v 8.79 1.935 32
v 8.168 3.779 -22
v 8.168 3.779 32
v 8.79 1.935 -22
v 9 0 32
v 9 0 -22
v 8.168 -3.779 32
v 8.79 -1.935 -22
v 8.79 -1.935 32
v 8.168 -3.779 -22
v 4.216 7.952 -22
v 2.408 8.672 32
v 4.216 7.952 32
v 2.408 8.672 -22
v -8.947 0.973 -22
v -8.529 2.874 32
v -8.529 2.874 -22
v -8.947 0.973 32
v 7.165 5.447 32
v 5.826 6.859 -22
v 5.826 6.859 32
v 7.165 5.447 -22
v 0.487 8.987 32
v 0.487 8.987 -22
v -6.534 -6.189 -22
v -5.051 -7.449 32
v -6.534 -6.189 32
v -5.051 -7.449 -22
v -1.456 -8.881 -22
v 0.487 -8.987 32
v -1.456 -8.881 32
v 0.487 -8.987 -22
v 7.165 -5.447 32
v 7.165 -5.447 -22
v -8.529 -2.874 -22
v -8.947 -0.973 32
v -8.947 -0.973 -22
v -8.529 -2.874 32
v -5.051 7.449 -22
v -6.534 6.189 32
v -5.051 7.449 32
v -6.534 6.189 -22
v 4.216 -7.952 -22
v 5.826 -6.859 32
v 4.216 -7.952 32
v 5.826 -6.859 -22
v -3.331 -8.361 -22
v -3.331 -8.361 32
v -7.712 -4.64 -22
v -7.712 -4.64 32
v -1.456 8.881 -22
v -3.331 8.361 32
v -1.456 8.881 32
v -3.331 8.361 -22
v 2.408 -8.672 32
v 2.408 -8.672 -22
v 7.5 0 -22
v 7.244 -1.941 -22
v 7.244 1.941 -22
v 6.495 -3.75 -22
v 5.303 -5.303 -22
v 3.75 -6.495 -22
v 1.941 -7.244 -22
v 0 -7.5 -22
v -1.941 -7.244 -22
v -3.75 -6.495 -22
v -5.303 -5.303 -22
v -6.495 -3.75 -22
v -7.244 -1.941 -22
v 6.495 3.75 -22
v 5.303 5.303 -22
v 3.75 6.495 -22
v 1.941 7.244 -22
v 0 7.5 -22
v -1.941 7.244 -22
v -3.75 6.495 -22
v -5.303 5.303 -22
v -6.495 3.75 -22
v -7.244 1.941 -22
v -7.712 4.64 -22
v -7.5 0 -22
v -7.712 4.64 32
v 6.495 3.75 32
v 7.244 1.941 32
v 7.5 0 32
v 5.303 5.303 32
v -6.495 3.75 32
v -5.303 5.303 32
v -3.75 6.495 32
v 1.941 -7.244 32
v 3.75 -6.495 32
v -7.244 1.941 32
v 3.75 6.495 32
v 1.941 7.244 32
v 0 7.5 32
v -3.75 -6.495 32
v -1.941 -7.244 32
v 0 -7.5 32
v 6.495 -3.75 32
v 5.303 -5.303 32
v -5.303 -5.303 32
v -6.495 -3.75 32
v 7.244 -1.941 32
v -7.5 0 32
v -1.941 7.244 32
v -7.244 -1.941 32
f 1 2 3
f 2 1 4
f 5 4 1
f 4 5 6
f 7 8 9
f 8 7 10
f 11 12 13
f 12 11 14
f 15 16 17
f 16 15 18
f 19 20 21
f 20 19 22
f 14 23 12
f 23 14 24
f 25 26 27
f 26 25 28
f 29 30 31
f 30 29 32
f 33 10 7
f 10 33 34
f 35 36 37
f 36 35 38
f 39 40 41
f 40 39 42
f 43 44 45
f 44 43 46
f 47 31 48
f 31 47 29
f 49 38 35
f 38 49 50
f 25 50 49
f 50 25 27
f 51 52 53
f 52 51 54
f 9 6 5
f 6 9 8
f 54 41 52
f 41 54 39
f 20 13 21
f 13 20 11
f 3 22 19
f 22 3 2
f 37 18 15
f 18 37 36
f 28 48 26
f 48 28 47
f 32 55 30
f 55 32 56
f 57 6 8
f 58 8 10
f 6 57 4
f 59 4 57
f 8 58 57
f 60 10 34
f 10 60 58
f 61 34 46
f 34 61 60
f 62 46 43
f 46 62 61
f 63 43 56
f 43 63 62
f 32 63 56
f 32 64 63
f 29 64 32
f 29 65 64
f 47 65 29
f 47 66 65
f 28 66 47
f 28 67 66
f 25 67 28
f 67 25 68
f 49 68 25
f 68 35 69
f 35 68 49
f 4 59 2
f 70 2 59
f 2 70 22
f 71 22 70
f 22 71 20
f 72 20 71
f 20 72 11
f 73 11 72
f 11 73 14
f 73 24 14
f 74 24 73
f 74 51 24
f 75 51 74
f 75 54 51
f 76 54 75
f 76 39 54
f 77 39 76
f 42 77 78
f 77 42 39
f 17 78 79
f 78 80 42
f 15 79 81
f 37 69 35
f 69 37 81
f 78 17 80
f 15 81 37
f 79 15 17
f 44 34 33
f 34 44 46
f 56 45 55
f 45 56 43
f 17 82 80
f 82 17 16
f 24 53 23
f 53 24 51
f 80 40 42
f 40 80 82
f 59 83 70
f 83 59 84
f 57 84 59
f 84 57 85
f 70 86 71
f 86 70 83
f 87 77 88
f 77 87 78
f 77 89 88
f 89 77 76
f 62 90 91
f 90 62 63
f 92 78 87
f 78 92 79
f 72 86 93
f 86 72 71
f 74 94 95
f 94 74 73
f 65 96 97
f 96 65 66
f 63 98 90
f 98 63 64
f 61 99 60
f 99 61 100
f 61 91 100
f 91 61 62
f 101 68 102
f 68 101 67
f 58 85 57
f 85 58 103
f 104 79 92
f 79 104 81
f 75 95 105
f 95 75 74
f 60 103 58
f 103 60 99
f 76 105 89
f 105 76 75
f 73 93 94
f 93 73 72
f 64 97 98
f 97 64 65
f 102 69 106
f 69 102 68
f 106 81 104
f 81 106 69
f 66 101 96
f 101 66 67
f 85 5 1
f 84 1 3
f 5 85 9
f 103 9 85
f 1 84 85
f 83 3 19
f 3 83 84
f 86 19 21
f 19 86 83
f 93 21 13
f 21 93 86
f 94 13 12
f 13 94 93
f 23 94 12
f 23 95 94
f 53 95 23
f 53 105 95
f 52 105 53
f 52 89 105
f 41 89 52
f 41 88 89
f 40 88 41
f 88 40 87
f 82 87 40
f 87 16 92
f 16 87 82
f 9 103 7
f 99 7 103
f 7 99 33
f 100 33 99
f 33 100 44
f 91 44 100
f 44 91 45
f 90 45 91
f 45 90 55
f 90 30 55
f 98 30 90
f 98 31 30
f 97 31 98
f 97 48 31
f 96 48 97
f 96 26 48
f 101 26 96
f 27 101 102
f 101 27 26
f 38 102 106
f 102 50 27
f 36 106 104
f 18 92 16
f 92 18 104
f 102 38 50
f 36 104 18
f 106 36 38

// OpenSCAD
//cylinder 1 上
difference(){
    translate ([0,0,-22])cylinder(h=32, d=18);
    translate([0,0,-23])cylinder(h=33, d=15);
}


//cylinder 下   
difference(){
        cylinder (h=32, d=18);
        translate([0,0,0]) ;
        cylinder(h=33, d=15); 
        }
